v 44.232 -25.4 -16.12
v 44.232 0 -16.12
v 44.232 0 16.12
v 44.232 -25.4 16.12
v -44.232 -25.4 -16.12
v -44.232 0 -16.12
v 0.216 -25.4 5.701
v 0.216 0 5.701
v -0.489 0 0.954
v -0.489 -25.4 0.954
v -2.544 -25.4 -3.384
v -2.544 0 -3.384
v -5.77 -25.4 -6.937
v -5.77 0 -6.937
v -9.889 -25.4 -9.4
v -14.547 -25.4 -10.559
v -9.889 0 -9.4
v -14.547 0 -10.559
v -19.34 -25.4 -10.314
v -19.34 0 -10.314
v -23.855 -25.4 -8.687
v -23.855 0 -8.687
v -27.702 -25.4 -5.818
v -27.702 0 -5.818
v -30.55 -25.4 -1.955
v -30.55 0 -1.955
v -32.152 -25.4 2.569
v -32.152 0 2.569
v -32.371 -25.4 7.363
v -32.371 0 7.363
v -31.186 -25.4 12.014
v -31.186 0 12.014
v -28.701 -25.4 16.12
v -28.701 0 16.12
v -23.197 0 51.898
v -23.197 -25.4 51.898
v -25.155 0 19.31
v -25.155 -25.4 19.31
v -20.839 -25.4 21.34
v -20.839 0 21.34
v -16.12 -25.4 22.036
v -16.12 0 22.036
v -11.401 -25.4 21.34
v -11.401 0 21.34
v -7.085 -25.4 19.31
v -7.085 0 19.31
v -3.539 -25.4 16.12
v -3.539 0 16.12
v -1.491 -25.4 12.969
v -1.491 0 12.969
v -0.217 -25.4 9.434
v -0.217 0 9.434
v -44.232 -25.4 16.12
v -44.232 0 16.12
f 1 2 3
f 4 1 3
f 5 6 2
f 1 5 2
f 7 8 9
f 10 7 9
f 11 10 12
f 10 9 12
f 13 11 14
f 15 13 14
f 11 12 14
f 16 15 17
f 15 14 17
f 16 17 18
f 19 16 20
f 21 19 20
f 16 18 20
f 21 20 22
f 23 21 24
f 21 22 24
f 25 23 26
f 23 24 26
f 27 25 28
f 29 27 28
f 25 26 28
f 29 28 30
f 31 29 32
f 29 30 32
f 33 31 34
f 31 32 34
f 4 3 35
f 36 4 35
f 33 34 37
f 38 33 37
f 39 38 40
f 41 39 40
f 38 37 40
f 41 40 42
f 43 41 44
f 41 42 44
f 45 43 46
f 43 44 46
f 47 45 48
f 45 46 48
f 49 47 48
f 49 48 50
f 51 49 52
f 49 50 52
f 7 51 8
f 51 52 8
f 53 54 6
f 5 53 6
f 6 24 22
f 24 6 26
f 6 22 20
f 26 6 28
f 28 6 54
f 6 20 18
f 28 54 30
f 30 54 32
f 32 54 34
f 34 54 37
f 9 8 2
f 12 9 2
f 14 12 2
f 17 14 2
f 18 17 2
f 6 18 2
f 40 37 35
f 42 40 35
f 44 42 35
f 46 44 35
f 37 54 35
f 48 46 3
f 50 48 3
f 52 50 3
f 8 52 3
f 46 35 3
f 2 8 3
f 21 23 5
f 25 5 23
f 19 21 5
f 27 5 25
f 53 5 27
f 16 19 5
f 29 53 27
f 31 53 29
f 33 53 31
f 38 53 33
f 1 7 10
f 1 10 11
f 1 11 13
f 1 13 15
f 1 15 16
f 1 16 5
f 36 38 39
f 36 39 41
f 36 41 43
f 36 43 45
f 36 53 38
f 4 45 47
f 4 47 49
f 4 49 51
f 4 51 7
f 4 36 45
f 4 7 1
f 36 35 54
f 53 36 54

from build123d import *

# Parameters (mm, degrees)
F1_DEPTH = 25.4


# Not quite as in the source:
# - a feature names something its author has since deleted; it is built from what else it names


with BuildPart() as f1:
    # F0 (on Front) → F1 (new body)
    with BuildSketch(Plane.XZ):
        with BuildLine():
            Line((-23.1970027089, 51.8983751535), (-44.2315712571, 16.1199513823))
            Line((-44.2315712571, 16.1199513823), (-28.70137633, 16.1199513823))
            ThreePointArc((-28.70137633, 16.1199513823), (-16.1199513823, 22.0364309456), (-3.5385264346, 16.1199513823))
            Line((-3.5385264346, 16.1199513823), (44.2315712571, 16.1199513823))
            Line((44.2315712571, 16.1199513823), (-23.1970027089, 51.8983751535))
        make_face()
        with BuildLine():
            Line((-28.70137633, 16.1199513823), (-44.2315712571, 16.1199513823))
            Line((-44.2315712571, 16.1199513823), (-44.2315712571, -16.1199513823))
            Line((-44.2315712571, -16.1199513823), (44.2315712571, -16.1199513823))
            Line((44.2315712571, -16.1199513823), (44.2315712571, 16.1199513823))
            Line((44.2315712571, 16.1199513823), (-3.5385264346, 16.1199513823))
            ThreePointArc((-3.5385264346, 16.1199513823), (-0.7516202277, 11.2382926218), (0.215521602, 5.7009579614))
            ThreePointArc((0.215521602, 5.7009579614), (-21.6572860427, -9.6673731932), (-28.70137633, 16.1199513823))
        make_face()
    extrude(amount=F1_DEPTH)


solid = f1.part
